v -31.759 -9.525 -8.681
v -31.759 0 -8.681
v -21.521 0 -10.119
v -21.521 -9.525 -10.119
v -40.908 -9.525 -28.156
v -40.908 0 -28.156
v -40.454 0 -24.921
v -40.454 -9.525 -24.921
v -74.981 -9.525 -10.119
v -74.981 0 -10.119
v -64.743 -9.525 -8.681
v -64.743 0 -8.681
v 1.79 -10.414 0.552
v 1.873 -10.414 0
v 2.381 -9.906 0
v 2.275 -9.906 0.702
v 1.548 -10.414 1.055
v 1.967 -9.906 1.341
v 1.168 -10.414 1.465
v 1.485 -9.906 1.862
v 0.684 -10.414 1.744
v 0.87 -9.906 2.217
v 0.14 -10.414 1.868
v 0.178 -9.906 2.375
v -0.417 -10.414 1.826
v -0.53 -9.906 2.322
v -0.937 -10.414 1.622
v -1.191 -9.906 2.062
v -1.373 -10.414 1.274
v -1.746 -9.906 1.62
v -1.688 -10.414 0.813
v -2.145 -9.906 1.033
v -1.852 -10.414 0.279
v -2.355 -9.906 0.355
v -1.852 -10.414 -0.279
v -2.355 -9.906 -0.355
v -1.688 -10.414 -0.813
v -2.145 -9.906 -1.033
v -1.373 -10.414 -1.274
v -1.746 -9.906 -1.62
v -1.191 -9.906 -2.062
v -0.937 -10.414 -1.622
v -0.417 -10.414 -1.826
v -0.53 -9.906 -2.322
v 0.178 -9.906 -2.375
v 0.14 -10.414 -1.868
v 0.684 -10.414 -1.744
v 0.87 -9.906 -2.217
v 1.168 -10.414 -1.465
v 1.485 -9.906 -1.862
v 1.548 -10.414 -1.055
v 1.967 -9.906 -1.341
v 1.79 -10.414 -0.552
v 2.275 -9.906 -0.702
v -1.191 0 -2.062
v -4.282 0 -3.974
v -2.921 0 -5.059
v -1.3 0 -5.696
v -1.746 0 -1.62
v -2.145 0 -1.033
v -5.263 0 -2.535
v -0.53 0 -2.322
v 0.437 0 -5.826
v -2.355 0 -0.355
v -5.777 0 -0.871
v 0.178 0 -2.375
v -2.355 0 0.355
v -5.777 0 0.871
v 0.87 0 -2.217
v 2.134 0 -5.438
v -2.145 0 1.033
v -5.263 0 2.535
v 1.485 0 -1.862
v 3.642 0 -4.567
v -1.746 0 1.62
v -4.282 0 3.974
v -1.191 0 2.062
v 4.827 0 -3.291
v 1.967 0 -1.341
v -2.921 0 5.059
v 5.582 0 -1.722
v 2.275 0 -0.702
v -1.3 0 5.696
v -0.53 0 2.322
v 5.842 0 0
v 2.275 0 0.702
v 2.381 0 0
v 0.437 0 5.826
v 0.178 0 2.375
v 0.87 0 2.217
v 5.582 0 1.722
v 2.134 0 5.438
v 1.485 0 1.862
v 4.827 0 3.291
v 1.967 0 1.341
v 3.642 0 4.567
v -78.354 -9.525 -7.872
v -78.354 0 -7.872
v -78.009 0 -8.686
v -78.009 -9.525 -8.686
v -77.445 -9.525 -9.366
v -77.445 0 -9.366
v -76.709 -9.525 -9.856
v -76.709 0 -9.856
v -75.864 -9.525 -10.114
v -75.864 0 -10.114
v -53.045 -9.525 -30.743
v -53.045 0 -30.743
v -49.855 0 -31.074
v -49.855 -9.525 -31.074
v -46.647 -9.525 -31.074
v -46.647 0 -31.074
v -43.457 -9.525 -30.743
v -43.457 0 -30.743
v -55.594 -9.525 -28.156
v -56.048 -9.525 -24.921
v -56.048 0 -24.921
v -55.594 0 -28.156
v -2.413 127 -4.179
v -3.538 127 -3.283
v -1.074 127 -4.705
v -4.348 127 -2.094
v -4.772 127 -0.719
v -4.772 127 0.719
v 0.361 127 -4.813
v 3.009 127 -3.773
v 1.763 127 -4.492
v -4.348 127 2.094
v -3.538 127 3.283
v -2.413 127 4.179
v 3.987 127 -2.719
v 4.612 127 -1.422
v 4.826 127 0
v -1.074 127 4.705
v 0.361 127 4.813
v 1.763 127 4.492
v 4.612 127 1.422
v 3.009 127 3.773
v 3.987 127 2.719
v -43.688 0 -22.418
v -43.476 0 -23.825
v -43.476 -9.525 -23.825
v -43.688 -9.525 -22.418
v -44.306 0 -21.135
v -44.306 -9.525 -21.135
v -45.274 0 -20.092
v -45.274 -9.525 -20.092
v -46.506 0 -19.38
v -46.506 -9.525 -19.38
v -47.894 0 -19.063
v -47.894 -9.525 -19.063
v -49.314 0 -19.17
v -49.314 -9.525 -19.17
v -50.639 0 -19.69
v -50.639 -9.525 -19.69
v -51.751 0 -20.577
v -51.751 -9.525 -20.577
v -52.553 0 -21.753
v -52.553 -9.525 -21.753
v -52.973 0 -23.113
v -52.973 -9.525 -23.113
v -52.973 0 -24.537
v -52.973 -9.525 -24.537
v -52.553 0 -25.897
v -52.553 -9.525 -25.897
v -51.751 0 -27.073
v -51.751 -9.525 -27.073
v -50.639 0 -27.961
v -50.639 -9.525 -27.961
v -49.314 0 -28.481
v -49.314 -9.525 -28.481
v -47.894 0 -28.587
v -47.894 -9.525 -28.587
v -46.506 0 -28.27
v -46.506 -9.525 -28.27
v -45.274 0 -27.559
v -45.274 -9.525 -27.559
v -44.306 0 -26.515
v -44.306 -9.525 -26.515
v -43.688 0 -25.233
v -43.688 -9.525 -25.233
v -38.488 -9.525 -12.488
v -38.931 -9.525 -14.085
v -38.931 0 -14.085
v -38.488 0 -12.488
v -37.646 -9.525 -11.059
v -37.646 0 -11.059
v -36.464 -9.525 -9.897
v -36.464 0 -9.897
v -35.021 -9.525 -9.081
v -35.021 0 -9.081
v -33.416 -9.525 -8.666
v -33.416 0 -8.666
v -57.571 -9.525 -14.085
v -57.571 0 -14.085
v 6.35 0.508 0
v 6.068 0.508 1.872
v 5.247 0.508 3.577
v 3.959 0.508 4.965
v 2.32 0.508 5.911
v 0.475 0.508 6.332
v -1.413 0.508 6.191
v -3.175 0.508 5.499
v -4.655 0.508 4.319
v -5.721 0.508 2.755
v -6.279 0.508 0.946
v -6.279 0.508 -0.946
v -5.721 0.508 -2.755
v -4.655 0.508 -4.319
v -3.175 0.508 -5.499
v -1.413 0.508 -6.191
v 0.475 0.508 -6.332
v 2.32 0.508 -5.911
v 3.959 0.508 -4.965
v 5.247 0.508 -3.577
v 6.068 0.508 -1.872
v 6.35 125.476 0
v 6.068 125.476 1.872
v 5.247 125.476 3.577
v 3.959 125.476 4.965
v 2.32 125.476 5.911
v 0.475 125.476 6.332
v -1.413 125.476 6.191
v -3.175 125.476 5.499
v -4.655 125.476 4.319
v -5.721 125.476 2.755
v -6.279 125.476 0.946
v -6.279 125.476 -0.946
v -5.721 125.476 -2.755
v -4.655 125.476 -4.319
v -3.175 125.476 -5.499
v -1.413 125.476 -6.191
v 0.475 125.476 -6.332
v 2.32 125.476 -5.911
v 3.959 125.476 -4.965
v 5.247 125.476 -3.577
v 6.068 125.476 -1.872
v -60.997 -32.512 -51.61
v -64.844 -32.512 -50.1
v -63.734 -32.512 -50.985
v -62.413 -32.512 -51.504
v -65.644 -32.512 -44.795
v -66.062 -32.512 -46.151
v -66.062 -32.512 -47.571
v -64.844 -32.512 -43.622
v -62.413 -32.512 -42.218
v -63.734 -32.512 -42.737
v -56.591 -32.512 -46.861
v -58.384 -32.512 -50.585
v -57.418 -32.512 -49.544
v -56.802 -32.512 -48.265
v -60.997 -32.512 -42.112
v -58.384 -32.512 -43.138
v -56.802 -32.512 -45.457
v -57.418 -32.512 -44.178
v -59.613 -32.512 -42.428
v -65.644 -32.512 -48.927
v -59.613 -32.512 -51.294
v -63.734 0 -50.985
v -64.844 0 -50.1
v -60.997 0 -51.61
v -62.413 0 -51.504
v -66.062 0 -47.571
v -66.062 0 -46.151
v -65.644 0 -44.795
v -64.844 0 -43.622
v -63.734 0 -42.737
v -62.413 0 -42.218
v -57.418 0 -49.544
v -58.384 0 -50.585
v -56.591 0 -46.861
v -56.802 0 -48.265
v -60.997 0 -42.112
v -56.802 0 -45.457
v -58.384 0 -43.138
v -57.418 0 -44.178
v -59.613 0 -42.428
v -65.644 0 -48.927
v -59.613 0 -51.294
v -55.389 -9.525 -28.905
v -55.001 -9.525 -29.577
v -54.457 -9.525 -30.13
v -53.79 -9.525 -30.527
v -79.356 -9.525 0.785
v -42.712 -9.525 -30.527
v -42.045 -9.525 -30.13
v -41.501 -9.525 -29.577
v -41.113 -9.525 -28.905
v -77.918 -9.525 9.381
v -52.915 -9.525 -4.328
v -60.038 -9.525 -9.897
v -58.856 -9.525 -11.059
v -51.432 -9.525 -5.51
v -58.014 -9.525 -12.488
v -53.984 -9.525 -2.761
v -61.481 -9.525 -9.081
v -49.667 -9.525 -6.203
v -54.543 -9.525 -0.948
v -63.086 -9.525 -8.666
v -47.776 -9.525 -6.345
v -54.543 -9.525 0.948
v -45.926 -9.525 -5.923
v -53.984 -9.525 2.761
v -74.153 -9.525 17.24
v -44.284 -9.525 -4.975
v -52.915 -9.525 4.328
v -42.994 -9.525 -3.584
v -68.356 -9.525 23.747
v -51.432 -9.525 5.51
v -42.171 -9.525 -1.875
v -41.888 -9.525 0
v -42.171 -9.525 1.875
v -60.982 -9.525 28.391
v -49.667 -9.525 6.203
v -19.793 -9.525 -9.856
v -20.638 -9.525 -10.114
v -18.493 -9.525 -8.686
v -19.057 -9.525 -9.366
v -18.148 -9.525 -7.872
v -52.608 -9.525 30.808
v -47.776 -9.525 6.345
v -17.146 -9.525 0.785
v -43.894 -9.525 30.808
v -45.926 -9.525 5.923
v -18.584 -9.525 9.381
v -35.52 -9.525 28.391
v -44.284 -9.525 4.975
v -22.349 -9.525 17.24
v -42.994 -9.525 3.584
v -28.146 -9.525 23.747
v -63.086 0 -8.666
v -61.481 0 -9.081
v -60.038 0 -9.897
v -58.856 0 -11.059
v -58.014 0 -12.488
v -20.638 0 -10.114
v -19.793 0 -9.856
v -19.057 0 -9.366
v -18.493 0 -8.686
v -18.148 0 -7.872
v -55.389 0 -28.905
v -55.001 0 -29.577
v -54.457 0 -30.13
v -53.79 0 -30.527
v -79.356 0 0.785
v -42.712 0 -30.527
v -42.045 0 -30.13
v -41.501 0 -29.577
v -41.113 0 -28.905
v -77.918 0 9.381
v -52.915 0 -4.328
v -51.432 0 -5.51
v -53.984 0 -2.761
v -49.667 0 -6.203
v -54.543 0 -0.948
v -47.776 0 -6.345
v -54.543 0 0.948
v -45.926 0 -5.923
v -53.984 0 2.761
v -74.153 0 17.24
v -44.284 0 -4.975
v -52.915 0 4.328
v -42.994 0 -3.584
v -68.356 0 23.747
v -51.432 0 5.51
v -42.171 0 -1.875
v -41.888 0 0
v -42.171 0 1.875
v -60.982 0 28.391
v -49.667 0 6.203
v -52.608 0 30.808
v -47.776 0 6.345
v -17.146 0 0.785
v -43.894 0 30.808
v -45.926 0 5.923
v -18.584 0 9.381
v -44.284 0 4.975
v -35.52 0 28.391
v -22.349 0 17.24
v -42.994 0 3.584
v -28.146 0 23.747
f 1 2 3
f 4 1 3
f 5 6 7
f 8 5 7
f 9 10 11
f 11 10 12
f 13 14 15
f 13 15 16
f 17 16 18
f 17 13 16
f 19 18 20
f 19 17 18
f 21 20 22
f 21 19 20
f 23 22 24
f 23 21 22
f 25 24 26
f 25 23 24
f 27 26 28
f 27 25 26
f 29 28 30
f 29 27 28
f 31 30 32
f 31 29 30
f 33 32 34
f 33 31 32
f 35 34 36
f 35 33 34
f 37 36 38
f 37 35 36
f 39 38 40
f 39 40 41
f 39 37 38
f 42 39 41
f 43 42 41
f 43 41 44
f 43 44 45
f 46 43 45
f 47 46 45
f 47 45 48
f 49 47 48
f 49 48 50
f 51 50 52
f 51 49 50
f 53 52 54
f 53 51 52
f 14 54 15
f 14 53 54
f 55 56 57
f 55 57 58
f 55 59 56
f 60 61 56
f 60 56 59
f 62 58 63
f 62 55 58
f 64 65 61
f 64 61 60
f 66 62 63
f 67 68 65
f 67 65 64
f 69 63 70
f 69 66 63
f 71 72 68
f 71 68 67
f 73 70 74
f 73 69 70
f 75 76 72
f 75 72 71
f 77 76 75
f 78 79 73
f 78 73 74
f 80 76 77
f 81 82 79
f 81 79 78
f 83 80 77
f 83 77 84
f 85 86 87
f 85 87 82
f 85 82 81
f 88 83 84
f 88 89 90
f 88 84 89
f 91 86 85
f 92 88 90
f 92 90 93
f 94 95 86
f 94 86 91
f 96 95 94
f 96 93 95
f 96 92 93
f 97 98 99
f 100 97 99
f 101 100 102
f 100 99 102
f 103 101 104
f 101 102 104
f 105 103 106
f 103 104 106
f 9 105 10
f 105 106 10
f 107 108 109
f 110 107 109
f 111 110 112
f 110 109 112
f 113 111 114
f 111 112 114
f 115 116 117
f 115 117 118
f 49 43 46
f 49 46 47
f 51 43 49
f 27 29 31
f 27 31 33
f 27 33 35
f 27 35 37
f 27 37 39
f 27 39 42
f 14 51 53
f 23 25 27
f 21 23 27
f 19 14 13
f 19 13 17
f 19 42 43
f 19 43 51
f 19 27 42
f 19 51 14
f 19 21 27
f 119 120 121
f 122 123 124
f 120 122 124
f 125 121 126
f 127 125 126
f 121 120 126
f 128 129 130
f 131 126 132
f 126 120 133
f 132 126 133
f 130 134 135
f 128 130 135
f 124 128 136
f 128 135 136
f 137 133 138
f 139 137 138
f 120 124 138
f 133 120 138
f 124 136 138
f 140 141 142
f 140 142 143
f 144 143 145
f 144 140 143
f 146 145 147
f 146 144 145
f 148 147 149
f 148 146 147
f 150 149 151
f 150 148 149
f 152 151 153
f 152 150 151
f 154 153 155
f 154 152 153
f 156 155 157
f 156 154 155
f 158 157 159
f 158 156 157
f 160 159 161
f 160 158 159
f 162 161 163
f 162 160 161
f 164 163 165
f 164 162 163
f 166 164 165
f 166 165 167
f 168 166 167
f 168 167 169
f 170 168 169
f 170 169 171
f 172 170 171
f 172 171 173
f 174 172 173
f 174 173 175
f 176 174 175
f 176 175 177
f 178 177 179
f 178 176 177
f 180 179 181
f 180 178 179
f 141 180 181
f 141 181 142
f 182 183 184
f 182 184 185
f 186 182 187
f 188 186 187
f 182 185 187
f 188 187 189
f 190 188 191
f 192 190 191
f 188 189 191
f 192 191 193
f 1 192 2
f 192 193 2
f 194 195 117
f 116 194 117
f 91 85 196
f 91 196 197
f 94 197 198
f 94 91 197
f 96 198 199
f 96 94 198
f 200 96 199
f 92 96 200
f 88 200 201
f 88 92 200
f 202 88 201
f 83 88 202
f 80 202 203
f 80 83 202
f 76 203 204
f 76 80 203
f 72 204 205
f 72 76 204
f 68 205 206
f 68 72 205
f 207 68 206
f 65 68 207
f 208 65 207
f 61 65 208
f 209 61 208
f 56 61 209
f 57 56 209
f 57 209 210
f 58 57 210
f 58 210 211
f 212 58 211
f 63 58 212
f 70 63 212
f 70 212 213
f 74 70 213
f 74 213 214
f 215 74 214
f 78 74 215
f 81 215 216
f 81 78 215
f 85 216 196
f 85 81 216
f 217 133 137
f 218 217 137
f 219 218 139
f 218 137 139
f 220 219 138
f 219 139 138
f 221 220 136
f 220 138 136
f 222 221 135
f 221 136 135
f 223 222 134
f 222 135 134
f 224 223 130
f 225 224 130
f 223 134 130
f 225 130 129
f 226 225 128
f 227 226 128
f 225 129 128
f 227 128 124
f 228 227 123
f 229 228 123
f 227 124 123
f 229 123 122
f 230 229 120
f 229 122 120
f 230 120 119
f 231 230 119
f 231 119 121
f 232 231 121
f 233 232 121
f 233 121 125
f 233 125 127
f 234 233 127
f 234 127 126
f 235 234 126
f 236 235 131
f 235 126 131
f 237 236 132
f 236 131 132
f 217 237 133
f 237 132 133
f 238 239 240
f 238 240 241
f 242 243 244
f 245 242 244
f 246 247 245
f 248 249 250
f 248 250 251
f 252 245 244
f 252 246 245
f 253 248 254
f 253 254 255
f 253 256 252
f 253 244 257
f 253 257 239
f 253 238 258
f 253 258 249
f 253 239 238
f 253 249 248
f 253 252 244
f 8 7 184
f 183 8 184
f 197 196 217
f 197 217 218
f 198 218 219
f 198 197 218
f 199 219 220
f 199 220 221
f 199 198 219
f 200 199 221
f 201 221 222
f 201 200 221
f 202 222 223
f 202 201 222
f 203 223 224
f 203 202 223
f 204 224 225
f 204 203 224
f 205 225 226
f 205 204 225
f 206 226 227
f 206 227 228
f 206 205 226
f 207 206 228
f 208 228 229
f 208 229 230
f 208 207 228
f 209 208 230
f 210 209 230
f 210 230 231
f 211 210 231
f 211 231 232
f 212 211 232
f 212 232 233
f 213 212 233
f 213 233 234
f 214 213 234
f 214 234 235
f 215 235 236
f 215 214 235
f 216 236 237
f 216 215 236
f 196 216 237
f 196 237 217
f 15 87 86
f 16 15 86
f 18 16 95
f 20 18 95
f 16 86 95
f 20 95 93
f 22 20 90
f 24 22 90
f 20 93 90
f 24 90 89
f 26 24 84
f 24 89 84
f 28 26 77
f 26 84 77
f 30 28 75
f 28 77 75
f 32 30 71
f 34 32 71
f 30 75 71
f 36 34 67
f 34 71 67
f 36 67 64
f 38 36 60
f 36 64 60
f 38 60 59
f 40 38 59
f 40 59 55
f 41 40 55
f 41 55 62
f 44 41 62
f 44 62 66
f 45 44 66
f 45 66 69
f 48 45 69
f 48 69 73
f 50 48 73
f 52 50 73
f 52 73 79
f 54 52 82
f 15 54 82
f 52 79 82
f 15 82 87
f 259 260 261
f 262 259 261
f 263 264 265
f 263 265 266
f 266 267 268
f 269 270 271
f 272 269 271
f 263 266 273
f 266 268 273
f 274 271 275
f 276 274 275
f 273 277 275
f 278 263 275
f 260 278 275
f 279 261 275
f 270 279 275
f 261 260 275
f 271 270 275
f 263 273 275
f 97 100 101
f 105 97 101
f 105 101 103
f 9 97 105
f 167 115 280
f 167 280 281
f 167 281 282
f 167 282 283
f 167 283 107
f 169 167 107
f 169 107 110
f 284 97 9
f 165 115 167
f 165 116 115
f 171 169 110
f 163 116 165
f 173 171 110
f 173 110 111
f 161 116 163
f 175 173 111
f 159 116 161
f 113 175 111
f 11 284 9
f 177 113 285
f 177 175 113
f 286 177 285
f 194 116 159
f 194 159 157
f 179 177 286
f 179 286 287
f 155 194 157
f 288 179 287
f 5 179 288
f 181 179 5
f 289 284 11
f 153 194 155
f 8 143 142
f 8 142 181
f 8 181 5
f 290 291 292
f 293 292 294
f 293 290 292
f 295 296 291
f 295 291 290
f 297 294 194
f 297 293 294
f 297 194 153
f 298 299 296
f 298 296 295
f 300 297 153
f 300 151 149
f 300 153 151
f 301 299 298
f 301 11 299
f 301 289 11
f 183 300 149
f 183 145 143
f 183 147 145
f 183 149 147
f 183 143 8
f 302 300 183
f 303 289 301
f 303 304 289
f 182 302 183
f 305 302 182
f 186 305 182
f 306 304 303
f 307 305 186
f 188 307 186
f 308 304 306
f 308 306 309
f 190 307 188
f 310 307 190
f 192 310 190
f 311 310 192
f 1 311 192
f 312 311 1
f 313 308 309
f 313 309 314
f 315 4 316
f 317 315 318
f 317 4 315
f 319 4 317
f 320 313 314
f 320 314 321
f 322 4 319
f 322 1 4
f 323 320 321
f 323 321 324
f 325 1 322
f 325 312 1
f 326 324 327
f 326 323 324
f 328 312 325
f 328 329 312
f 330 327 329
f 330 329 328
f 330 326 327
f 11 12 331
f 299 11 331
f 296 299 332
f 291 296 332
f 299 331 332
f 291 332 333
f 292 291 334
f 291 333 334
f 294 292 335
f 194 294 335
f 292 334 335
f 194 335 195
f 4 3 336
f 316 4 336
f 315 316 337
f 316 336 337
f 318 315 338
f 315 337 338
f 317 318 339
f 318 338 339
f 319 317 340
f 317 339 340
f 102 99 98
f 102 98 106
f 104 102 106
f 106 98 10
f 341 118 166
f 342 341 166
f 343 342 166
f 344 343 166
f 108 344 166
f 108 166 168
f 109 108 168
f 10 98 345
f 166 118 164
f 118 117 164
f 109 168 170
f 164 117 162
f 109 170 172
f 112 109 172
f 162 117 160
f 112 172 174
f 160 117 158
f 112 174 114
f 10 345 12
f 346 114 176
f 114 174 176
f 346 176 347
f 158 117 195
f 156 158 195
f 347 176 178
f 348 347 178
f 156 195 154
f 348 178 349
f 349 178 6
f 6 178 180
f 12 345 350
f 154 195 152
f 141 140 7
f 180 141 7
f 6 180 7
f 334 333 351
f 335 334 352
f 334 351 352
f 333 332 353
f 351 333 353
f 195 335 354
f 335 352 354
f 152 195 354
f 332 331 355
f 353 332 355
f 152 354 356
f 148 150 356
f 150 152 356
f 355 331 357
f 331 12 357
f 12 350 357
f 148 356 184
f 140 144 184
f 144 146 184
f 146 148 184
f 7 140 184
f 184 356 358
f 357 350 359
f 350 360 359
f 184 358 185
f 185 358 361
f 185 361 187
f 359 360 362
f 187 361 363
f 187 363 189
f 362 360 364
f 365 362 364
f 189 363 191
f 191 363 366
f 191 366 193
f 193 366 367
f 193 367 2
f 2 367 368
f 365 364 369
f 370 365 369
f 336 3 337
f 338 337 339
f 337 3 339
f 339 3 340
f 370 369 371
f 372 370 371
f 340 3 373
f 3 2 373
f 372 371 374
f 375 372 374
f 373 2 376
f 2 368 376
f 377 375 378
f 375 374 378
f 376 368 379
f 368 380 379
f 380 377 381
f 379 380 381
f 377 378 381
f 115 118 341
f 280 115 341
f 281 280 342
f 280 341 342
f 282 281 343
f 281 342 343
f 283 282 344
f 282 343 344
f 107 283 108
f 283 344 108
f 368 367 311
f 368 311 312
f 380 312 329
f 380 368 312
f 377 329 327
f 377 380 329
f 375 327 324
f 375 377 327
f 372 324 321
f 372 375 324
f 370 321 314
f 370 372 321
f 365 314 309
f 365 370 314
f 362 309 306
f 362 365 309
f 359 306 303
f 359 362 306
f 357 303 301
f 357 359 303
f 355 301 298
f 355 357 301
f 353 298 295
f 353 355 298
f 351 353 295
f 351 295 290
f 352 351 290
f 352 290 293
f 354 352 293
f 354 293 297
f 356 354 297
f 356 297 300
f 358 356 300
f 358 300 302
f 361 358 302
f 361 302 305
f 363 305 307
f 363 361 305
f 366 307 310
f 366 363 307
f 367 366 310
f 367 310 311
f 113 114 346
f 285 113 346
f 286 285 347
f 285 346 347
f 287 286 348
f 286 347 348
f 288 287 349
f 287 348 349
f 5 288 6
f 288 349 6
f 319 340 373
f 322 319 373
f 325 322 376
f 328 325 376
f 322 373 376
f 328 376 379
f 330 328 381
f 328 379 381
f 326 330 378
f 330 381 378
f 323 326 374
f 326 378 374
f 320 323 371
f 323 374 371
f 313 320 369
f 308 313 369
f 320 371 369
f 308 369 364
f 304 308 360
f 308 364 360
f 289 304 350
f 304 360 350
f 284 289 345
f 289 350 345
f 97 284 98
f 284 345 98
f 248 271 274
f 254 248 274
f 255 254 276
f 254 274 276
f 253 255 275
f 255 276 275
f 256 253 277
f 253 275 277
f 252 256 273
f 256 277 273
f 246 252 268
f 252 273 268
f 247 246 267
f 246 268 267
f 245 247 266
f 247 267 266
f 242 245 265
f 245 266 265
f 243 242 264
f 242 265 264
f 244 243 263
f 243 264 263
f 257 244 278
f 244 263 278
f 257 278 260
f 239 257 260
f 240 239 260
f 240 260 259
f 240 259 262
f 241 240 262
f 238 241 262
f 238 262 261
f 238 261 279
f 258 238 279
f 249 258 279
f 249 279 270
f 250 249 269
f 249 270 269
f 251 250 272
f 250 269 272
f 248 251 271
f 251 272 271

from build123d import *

# Parameters (mm, degrees)
F0_R     = 6.35
F1_DEPTH = 127
F2_R     = 2.38125
F3_DEPTH = 10.414
F4_SIZE  = 0.508
F5_SIZE  = 1.524
F6_R     = 4.7752
F6_R_2   = 6.3627
F7_DEPTH = 9.525
F8_R     = 4.7625
F9_DEPTH = 32.512


with BuildPart() as f1:
    # F0 (on Front) → F1 (new body)
    with BuildSketch(Plane.XZ):
        Circle(F0_R)
    extrude(amount=-F1_DEPTH)

    # F2 (on face) → F3 (join)
    with BuildSketch(Plane.XZ):
        Circle(F2_R)
    extrude(amount=F3_DEPTH)

    # F4
    f4_edges = [f1.edges().sort_by_distance(p)[0] for p in [
        (-2.38125, -10.414, 0),
        (-6.35, 0, 0),
    ]]
    chamfer(f4_edges, length=F4_SIZE)

    # F5
    f5_edges = [f1.edges().sort_by_distance(p)[0] for p in [
        (-6.35, 127, 0),
    ]]
    chamfer(f5_edges, length=F5_SIZE)


with BuildPart() as f7:
    # F6 (on Front) → F7 (new body)
    with BuildSketch(Plane.XZ):
        with BuildLine():
            ThreePointArc((-21.521355, -10.11931), (-19.40721, -9.637583), (-18.148319, -7.87212))
            ThreePointArc((-18.148319, -7.87212), (-48.251025, 31.115), (-78.353732, -7.87212))
            ThreePointArc((-78.353732, -7.87212), (-77.094841, -9.637583), (-74.980696, -10.11931))
            Line((-74.980696, -10.11931), (-64.743257, -8.680532))
            ThreePointArc((-64.743257, -8.680532), (-60.037982, -9.897399), (-57.571306, -14.084985))
            Line((-57.571306, -14.084985), (-56.048396, -24.921049))
            Line((-56.048396, -24.921049), (-55.593745, -28.156062))
            ThreePointArc((-55.593745, -28.156062), (-54.746841, -29.87083), (-53.045024, -30.743468))
            ThreePointArc((-53.045024, -30.743468), (-48.251025, -31.115), (-43.457027, -30.743468))
            ThreePointArc((-43.457027, -30.743468), (-41.75521, -29.87083), (-40.908306, -28.156062))
            Line((-40.908306, -28.156062), (-40.453655, -24.921049))
            Line((-40.453655, -24.921049), (-38.930745, -14.084985))
            ThreePointArc((-38.930745, -14.084985), (-36.464068, -9.897399), (-31.758794, -8.680532))
            Line((-31.758794, -8.680532), (-21.521355, -10.11931))
        make_face()
        with Locations((-48.251025, -23.8252)):
            Circle(F6_R, mode=Mode.SUBTRACT)
        with Locations((-48.251025, 0)):
            Circle(F6_R_2, mode=Mode.SUBTRACT)
    extrude(amount=F7_DEPTH)


with BuildPart() as f9:
    # F8 (on Front) → F9 (new body)
    with BuildSketch(Plane.XZ):
        with Locations((-61.353065, -46.861045)):
            Circle(F8_R)
    extrude(amount=F9_DEPTH)


solid = Compound([f1.part, f7.part, f9.part])
